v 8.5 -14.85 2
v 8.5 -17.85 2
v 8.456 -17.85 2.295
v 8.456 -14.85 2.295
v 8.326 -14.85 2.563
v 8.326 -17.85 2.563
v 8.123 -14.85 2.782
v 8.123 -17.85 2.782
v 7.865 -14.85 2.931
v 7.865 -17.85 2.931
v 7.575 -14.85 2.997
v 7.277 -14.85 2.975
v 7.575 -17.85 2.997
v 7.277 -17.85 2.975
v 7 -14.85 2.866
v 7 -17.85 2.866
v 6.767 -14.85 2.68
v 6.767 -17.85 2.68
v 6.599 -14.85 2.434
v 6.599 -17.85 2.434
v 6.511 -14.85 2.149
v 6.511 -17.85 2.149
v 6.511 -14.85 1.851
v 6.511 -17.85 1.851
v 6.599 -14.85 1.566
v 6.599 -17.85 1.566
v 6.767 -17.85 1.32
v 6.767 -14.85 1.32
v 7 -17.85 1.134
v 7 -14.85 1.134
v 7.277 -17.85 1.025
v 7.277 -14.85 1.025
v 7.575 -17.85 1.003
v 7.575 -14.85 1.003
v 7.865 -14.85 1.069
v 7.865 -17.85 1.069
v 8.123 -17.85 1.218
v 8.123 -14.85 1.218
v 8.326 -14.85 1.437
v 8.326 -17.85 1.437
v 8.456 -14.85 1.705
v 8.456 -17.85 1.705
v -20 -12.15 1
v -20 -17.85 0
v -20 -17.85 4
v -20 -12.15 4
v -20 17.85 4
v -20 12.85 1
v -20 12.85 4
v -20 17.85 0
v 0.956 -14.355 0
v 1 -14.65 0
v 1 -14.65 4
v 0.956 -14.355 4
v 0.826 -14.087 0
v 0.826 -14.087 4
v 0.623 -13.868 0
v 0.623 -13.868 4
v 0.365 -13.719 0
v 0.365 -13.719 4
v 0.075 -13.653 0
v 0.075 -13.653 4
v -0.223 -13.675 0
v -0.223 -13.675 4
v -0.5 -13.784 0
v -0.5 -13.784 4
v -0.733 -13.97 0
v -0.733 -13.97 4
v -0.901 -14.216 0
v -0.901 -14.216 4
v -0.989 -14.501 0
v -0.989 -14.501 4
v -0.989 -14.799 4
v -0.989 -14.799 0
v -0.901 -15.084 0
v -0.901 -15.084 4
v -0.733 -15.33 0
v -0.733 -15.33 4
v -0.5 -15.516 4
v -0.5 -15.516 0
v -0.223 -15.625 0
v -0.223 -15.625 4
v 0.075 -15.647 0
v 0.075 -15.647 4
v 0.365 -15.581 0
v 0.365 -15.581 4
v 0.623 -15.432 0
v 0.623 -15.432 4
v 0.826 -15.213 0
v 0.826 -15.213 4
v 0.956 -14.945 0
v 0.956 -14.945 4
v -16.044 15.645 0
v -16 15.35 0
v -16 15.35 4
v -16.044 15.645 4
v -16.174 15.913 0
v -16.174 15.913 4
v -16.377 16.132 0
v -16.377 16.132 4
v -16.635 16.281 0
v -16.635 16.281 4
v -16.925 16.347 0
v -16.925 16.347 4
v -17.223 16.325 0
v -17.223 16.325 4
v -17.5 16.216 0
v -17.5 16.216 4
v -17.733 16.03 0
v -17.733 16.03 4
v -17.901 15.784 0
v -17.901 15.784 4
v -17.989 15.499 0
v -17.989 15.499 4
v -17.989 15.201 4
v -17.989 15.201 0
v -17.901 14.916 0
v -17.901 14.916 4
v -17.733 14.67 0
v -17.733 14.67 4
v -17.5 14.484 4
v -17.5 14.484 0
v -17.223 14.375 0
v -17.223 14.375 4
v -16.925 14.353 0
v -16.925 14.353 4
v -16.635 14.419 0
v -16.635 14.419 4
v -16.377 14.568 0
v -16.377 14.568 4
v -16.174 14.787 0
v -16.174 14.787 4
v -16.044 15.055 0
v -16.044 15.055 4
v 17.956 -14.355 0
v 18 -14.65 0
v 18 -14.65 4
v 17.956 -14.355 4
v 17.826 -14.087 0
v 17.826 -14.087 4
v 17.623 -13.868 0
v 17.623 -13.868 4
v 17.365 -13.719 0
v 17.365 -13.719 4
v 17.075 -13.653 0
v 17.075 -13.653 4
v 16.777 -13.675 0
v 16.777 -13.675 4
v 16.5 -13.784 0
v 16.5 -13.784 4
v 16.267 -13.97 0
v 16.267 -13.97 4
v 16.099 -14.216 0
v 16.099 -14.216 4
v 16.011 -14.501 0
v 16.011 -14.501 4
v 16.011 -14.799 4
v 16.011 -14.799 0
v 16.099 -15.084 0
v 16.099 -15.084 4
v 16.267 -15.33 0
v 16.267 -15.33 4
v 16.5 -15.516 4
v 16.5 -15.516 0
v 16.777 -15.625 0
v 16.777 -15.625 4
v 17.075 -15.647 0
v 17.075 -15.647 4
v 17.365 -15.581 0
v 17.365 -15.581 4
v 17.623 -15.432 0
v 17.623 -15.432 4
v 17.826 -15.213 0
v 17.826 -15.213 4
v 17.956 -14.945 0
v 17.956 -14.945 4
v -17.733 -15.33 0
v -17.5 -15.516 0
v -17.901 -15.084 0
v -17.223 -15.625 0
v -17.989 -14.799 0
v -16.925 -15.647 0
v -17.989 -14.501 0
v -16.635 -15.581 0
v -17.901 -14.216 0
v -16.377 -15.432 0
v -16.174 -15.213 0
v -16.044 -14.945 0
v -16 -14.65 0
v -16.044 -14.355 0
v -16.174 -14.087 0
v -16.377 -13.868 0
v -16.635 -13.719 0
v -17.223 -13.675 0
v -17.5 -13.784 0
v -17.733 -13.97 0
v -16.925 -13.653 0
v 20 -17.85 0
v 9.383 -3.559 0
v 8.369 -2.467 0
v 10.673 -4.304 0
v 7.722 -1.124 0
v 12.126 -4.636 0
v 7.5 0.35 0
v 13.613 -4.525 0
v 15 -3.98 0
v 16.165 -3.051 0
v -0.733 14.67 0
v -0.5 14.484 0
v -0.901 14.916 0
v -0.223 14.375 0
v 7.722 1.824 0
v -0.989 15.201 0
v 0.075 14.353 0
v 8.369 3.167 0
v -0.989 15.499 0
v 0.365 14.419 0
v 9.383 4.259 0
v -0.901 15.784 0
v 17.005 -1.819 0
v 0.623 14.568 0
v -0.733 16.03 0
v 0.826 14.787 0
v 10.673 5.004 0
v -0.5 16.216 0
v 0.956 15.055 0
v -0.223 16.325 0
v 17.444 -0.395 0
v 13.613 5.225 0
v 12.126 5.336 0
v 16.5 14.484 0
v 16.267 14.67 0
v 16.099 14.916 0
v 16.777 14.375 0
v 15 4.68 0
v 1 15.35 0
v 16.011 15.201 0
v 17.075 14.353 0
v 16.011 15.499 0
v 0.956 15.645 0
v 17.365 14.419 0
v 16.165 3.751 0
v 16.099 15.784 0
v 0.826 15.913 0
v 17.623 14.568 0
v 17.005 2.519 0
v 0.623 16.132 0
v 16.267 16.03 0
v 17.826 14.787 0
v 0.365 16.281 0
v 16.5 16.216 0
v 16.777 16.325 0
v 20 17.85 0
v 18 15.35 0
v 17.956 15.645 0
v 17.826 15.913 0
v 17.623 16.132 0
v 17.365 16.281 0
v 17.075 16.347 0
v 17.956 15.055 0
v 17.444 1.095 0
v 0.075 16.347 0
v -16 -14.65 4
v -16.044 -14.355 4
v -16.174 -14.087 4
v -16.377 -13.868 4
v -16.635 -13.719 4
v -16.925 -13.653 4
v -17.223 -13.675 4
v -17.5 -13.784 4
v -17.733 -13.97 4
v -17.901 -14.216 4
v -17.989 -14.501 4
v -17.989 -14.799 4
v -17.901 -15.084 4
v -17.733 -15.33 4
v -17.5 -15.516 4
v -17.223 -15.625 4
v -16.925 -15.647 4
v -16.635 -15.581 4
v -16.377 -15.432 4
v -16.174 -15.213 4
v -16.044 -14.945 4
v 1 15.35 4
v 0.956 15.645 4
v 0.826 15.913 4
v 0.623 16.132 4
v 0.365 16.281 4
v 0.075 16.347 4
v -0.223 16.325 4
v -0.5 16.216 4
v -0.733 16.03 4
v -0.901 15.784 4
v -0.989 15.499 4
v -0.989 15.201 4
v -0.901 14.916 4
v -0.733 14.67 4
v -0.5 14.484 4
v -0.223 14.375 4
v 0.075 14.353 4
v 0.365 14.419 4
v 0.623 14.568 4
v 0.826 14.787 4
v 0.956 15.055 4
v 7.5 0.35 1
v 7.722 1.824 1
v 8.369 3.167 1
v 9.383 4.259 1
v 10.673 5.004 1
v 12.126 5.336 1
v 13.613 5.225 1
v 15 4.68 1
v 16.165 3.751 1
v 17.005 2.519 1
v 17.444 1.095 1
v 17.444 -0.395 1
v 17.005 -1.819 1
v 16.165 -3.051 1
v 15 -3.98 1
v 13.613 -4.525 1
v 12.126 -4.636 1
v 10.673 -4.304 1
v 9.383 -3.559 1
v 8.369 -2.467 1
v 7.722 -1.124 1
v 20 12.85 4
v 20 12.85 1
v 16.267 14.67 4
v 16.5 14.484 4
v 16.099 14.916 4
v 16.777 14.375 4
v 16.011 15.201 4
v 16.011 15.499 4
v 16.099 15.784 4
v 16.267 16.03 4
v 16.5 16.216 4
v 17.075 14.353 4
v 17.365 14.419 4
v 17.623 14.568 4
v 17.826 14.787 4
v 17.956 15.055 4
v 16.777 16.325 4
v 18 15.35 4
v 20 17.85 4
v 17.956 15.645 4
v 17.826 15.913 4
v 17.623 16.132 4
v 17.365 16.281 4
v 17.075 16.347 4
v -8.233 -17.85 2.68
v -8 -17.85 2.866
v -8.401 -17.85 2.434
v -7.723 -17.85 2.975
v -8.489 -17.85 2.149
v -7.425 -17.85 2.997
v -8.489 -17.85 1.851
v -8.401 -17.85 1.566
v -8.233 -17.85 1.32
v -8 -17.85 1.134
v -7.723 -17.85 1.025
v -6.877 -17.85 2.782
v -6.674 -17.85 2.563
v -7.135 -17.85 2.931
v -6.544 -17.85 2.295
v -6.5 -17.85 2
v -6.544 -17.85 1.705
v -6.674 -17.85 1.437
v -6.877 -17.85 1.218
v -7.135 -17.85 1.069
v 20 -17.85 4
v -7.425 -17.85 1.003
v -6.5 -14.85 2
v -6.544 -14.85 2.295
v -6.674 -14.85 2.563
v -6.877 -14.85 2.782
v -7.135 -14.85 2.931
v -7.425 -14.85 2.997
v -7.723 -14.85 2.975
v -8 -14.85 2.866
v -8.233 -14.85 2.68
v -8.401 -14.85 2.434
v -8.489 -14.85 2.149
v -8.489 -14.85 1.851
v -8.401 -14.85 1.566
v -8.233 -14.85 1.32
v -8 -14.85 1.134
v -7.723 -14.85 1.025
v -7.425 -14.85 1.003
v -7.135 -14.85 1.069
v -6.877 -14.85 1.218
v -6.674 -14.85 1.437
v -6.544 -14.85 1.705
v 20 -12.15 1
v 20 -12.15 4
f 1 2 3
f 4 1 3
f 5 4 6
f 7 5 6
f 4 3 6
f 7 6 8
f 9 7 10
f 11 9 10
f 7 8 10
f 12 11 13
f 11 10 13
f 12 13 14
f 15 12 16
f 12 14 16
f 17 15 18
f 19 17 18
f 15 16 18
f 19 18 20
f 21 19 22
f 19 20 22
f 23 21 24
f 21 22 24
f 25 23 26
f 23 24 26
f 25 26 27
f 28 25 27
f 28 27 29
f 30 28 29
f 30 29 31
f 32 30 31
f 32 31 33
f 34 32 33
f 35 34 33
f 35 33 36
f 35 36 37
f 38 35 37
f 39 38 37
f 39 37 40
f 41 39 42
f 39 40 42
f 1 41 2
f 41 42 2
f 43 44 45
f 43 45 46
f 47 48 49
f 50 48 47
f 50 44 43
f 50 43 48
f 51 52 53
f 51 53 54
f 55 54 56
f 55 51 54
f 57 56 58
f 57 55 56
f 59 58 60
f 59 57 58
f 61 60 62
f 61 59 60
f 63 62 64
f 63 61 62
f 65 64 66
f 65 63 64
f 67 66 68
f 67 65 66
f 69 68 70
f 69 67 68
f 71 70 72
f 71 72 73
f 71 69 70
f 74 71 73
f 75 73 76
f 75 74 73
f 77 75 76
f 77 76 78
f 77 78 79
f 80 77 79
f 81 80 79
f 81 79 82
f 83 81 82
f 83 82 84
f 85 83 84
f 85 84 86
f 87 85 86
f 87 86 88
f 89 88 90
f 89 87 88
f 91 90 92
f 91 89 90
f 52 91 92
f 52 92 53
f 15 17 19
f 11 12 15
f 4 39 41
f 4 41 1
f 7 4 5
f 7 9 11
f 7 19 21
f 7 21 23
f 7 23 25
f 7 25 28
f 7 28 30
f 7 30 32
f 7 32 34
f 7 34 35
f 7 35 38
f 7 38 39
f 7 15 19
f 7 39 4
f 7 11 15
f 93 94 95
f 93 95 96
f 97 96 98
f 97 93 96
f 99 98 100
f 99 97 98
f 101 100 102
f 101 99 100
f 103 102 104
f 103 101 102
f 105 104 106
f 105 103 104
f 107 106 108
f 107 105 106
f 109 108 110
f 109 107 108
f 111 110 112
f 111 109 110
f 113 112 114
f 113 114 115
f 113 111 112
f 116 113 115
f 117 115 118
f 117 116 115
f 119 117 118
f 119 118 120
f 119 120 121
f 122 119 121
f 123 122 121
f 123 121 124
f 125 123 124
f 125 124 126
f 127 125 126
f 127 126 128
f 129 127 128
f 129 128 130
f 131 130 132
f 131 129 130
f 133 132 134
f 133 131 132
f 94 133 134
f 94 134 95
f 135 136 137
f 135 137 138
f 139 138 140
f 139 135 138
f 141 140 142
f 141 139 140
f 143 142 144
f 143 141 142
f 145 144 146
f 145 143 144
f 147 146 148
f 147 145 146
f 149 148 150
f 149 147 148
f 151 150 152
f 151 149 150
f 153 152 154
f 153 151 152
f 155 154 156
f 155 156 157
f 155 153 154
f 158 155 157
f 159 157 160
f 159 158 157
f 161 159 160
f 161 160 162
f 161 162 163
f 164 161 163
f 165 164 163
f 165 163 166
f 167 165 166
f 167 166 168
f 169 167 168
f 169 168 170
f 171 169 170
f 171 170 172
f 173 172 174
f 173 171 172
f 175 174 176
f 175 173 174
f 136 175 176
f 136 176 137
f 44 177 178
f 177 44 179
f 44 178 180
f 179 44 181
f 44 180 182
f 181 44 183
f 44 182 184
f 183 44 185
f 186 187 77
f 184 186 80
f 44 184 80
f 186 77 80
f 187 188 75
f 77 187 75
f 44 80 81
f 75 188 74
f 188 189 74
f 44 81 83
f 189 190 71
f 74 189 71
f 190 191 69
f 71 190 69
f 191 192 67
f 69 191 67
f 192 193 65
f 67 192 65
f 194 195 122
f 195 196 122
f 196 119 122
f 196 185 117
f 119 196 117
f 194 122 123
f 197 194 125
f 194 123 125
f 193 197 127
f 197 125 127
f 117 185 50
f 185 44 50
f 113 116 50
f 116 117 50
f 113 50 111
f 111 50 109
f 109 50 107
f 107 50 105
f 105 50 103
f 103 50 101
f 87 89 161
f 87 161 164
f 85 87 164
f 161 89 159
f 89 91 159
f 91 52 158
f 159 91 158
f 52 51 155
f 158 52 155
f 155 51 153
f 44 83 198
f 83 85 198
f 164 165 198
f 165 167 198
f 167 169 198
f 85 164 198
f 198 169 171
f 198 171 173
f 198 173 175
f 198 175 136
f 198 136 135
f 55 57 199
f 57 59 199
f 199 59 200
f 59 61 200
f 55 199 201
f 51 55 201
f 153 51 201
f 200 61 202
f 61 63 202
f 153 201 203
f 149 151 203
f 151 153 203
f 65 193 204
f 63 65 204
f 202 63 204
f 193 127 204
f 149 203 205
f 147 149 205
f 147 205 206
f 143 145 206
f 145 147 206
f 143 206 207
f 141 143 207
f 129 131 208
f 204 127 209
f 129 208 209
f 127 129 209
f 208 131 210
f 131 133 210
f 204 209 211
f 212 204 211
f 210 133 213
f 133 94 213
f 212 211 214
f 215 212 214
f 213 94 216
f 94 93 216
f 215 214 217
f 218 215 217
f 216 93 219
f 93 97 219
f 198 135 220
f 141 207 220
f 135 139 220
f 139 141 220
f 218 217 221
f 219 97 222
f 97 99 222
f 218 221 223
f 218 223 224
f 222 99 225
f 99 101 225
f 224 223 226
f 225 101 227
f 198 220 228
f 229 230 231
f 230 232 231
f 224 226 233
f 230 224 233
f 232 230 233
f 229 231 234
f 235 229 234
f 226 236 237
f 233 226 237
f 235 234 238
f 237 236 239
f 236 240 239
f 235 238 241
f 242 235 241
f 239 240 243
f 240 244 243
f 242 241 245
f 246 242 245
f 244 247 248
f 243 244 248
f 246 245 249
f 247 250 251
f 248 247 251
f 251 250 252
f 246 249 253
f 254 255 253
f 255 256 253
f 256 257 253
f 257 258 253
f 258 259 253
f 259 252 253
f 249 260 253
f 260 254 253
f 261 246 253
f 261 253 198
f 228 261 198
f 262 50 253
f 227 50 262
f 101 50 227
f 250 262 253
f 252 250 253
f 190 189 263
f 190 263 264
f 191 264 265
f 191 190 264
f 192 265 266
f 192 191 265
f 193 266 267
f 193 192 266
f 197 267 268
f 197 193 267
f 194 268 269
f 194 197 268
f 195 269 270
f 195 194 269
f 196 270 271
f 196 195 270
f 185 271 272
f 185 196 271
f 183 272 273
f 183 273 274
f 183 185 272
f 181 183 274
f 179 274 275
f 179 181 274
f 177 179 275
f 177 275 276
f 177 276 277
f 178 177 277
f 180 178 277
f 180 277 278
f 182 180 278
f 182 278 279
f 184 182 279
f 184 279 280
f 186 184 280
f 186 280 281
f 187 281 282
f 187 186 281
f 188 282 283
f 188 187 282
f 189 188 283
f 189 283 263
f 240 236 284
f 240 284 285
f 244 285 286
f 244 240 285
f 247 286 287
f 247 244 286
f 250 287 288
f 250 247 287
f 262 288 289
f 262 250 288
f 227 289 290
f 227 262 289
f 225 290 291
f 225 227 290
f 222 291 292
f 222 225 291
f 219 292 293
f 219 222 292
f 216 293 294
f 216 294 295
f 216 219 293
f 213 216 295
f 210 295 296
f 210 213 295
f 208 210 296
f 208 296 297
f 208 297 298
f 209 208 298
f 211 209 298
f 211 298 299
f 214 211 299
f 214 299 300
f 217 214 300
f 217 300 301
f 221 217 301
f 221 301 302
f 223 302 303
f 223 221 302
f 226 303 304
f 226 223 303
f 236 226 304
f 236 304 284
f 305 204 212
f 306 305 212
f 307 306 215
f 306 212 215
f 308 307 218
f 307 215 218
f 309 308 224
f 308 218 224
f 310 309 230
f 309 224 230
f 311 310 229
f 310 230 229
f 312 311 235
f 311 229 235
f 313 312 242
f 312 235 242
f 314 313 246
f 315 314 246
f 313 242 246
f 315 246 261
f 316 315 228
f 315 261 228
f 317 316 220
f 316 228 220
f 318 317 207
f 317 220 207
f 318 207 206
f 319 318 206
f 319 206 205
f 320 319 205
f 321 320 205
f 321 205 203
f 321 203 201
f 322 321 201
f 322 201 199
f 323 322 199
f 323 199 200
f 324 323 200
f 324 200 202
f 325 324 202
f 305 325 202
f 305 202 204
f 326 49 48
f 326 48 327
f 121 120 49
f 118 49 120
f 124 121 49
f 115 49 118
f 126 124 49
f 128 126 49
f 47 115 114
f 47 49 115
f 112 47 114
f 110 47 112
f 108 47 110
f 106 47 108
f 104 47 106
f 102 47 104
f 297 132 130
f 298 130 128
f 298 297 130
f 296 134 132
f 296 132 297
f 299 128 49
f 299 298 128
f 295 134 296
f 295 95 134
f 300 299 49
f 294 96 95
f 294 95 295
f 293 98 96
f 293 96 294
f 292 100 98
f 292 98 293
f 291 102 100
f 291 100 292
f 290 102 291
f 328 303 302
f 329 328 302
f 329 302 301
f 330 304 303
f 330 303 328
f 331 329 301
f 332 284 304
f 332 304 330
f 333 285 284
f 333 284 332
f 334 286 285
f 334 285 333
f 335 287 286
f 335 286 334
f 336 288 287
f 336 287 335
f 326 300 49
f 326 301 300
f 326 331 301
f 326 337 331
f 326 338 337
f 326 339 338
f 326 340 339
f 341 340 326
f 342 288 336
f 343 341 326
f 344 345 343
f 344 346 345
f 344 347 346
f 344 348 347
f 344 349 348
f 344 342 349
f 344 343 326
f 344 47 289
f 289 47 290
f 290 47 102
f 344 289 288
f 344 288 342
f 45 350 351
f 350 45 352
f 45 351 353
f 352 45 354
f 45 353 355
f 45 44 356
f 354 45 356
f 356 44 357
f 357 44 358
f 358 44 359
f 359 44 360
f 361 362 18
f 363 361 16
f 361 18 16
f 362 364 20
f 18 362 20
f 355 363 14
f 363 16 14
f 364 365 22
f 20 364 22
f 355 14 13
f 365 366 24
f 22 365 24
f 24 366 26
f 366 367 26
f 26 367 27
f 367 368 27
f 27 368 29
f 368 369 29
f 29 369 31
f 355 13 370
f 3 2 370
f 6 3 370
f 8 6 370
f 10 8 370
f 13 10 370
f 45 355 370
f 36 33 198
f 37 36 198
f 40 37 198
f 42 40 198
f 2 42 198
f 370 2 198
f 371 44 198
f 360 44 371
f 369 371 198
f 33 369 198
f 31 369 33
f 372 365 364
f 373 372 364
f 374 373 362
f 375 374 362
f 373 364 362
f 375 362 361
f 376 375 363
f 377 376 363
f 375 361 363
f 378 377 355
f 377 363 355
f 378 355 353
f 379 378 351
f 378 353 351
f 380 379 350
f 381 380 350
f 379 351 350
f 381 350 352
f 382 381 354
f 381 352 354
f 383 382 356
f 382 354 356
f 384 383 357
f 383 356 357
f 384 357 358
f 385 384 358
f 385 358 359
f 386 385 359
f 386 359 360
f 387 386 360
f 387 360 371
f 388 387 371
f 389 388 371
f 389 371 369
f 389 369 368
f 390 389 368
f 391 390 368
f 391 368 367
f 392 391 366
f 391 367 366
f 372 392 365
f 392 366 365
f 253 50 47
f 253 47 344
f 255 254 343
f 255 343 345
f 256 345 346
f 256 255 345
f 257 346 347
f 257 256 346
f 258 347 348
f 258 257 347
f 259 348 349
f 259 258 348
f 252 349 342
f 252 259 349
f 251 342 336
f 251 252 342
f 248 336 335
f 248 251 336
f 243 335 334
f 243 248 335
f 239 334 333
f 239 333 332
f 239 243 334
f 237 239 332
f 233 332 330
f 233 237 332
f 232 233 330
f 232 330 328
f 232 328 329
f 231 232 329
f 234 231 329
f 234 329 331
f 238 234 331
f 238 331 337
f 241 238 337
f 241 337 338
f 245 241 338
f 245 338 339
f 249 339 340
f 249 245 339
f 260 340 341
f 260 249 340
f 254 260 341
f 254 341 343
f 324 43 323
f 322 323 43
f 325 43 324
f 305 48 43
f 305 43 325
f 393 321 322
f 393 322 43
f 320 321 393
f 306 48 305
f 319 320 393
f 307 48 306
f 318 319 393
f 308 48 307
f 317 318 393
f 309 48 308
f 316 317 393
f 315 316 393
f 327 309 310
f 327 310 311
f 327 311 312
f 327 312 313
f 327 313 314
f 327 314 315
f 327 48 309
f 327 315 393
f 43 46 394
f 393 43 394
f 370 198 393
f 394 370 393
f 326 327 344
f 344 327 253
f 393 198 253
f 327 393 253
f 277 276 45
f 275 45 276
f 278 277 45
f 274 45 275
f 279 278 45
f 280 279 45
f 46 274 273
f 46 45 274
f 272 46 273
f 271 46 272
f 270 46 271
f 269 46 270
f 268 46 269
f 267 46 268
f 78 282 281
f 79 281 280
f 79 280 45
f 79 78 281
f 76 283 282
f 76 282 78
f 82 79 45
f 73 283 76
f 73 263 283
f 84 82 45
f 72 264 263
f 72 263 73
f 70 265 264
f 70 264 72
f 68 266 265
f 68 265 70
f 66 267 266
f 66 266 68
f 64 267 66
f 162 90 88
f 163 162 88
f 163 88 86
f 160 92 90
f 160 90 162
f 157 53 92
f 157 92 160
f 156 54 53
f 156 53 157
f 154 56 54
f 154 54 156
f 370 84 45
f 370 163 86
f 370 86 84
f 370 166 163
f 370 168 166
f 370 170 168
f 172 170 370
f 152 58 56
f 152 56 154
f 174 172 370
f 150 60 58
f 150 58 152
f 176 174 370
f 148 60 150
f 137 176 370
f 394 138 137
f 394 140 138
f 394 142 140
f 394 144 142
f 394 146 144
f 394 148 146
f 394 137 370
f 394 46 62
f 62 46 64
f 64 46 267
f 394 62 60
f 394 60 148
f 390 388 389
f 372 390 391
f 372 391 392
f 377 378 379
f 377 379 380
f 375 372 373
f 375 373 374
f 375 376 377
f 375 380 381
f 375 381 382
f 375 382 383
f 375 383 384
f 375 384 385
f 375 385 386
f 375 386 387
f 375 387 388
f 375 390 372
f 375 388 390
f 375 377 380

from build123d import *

# Parameters (mm, degrees)
SKETCH1_W           = 40
SKETCH1_H           = 35.7
SKETCH1_R           = 1
BOSS_EXTRUDE1_DEPTH = 4
SKETCH2_W           = 50
SKETCH2_H           = 25
CUT_EXTRUDE1_DEPTH  = 3
SKETCH3_R           = 1
CUT_EXTRUDE2_DEPTH  = 3
SKETCH4_R           = 5
CUT_EXTRUDE3_DEPTH  = 28.103920381


with BuildPart() as part:
    # Sketch1 → Boss-Extrude1 (new body)
    with BuildSketch(Plane.XY):
        Rectangle(SKETCH1_W, SKETCH1_H)
        with Locations((-17, 15.35)):
            Circle(SKETCH1_R, mode=Mode.SUBTRACT)
        with Locations((0, 15.35)):
            Circle(SKETCH1_R, mode=Mode.SUBTRACT)
        with Locations((17, 15.35)):
            Circle(SKETCH1_R, mode=Mode.SUBTRACT)
        with Locations((-17, -14.65)):
            Circle(SKETCH1_R, mode=Mode.SUBTRACT)
        with Locations((0, -14.65)):
            Circle(SKETCH1_R, mode=Mode.SUBTRACT)
        with Locations((17, -14.65)):
            Circle(SKETCH1_R, mode=Mode.SUBTRACT)
    extrude(amount=BOSS_EXTRUDE1_DEPTH)

    # Sketch2 → Cut-Extrude1 (cut)
    with BuildSketch(Plane.XY.offset(4)):
        with Locations((0, 0.35)):
            Rectangle(SKETCH2_W, SKETCH2_H)
    extrude(amount=-CUT_EXTRUDE1_DEPTH, mode=Mode.SUBTRACT)

    # Sketch3 → Cut-Extrude2 (cut)
    with BuildSketch(Plane.XZ.offset(17.85)):
        with Locations((-7.5, 2)):
            Circle(SKETCH3_R)
        with Locations((7.5, 2)):
            Circle(SKETCH3_R)
    extrude(amount=-CUT_EXTRUDE2_DEPTH, mode=Mode.SUBTRACT)

    # Sketch4 → Cut-Extrude3 (cut, through all)
    with BuildSketch(Plane(origin=(0, 0, 0), x_dir=(-1, 0, 0), z_dir=(0, 0, -1))):
        with Locations((-12.5, 0.35)):
            Circle(SKETCH4_R)
    extrude(amount=-CUT_EXTRUDE3_DEPTH, mode=Mode.SUBTRACT)


solid = part.part
